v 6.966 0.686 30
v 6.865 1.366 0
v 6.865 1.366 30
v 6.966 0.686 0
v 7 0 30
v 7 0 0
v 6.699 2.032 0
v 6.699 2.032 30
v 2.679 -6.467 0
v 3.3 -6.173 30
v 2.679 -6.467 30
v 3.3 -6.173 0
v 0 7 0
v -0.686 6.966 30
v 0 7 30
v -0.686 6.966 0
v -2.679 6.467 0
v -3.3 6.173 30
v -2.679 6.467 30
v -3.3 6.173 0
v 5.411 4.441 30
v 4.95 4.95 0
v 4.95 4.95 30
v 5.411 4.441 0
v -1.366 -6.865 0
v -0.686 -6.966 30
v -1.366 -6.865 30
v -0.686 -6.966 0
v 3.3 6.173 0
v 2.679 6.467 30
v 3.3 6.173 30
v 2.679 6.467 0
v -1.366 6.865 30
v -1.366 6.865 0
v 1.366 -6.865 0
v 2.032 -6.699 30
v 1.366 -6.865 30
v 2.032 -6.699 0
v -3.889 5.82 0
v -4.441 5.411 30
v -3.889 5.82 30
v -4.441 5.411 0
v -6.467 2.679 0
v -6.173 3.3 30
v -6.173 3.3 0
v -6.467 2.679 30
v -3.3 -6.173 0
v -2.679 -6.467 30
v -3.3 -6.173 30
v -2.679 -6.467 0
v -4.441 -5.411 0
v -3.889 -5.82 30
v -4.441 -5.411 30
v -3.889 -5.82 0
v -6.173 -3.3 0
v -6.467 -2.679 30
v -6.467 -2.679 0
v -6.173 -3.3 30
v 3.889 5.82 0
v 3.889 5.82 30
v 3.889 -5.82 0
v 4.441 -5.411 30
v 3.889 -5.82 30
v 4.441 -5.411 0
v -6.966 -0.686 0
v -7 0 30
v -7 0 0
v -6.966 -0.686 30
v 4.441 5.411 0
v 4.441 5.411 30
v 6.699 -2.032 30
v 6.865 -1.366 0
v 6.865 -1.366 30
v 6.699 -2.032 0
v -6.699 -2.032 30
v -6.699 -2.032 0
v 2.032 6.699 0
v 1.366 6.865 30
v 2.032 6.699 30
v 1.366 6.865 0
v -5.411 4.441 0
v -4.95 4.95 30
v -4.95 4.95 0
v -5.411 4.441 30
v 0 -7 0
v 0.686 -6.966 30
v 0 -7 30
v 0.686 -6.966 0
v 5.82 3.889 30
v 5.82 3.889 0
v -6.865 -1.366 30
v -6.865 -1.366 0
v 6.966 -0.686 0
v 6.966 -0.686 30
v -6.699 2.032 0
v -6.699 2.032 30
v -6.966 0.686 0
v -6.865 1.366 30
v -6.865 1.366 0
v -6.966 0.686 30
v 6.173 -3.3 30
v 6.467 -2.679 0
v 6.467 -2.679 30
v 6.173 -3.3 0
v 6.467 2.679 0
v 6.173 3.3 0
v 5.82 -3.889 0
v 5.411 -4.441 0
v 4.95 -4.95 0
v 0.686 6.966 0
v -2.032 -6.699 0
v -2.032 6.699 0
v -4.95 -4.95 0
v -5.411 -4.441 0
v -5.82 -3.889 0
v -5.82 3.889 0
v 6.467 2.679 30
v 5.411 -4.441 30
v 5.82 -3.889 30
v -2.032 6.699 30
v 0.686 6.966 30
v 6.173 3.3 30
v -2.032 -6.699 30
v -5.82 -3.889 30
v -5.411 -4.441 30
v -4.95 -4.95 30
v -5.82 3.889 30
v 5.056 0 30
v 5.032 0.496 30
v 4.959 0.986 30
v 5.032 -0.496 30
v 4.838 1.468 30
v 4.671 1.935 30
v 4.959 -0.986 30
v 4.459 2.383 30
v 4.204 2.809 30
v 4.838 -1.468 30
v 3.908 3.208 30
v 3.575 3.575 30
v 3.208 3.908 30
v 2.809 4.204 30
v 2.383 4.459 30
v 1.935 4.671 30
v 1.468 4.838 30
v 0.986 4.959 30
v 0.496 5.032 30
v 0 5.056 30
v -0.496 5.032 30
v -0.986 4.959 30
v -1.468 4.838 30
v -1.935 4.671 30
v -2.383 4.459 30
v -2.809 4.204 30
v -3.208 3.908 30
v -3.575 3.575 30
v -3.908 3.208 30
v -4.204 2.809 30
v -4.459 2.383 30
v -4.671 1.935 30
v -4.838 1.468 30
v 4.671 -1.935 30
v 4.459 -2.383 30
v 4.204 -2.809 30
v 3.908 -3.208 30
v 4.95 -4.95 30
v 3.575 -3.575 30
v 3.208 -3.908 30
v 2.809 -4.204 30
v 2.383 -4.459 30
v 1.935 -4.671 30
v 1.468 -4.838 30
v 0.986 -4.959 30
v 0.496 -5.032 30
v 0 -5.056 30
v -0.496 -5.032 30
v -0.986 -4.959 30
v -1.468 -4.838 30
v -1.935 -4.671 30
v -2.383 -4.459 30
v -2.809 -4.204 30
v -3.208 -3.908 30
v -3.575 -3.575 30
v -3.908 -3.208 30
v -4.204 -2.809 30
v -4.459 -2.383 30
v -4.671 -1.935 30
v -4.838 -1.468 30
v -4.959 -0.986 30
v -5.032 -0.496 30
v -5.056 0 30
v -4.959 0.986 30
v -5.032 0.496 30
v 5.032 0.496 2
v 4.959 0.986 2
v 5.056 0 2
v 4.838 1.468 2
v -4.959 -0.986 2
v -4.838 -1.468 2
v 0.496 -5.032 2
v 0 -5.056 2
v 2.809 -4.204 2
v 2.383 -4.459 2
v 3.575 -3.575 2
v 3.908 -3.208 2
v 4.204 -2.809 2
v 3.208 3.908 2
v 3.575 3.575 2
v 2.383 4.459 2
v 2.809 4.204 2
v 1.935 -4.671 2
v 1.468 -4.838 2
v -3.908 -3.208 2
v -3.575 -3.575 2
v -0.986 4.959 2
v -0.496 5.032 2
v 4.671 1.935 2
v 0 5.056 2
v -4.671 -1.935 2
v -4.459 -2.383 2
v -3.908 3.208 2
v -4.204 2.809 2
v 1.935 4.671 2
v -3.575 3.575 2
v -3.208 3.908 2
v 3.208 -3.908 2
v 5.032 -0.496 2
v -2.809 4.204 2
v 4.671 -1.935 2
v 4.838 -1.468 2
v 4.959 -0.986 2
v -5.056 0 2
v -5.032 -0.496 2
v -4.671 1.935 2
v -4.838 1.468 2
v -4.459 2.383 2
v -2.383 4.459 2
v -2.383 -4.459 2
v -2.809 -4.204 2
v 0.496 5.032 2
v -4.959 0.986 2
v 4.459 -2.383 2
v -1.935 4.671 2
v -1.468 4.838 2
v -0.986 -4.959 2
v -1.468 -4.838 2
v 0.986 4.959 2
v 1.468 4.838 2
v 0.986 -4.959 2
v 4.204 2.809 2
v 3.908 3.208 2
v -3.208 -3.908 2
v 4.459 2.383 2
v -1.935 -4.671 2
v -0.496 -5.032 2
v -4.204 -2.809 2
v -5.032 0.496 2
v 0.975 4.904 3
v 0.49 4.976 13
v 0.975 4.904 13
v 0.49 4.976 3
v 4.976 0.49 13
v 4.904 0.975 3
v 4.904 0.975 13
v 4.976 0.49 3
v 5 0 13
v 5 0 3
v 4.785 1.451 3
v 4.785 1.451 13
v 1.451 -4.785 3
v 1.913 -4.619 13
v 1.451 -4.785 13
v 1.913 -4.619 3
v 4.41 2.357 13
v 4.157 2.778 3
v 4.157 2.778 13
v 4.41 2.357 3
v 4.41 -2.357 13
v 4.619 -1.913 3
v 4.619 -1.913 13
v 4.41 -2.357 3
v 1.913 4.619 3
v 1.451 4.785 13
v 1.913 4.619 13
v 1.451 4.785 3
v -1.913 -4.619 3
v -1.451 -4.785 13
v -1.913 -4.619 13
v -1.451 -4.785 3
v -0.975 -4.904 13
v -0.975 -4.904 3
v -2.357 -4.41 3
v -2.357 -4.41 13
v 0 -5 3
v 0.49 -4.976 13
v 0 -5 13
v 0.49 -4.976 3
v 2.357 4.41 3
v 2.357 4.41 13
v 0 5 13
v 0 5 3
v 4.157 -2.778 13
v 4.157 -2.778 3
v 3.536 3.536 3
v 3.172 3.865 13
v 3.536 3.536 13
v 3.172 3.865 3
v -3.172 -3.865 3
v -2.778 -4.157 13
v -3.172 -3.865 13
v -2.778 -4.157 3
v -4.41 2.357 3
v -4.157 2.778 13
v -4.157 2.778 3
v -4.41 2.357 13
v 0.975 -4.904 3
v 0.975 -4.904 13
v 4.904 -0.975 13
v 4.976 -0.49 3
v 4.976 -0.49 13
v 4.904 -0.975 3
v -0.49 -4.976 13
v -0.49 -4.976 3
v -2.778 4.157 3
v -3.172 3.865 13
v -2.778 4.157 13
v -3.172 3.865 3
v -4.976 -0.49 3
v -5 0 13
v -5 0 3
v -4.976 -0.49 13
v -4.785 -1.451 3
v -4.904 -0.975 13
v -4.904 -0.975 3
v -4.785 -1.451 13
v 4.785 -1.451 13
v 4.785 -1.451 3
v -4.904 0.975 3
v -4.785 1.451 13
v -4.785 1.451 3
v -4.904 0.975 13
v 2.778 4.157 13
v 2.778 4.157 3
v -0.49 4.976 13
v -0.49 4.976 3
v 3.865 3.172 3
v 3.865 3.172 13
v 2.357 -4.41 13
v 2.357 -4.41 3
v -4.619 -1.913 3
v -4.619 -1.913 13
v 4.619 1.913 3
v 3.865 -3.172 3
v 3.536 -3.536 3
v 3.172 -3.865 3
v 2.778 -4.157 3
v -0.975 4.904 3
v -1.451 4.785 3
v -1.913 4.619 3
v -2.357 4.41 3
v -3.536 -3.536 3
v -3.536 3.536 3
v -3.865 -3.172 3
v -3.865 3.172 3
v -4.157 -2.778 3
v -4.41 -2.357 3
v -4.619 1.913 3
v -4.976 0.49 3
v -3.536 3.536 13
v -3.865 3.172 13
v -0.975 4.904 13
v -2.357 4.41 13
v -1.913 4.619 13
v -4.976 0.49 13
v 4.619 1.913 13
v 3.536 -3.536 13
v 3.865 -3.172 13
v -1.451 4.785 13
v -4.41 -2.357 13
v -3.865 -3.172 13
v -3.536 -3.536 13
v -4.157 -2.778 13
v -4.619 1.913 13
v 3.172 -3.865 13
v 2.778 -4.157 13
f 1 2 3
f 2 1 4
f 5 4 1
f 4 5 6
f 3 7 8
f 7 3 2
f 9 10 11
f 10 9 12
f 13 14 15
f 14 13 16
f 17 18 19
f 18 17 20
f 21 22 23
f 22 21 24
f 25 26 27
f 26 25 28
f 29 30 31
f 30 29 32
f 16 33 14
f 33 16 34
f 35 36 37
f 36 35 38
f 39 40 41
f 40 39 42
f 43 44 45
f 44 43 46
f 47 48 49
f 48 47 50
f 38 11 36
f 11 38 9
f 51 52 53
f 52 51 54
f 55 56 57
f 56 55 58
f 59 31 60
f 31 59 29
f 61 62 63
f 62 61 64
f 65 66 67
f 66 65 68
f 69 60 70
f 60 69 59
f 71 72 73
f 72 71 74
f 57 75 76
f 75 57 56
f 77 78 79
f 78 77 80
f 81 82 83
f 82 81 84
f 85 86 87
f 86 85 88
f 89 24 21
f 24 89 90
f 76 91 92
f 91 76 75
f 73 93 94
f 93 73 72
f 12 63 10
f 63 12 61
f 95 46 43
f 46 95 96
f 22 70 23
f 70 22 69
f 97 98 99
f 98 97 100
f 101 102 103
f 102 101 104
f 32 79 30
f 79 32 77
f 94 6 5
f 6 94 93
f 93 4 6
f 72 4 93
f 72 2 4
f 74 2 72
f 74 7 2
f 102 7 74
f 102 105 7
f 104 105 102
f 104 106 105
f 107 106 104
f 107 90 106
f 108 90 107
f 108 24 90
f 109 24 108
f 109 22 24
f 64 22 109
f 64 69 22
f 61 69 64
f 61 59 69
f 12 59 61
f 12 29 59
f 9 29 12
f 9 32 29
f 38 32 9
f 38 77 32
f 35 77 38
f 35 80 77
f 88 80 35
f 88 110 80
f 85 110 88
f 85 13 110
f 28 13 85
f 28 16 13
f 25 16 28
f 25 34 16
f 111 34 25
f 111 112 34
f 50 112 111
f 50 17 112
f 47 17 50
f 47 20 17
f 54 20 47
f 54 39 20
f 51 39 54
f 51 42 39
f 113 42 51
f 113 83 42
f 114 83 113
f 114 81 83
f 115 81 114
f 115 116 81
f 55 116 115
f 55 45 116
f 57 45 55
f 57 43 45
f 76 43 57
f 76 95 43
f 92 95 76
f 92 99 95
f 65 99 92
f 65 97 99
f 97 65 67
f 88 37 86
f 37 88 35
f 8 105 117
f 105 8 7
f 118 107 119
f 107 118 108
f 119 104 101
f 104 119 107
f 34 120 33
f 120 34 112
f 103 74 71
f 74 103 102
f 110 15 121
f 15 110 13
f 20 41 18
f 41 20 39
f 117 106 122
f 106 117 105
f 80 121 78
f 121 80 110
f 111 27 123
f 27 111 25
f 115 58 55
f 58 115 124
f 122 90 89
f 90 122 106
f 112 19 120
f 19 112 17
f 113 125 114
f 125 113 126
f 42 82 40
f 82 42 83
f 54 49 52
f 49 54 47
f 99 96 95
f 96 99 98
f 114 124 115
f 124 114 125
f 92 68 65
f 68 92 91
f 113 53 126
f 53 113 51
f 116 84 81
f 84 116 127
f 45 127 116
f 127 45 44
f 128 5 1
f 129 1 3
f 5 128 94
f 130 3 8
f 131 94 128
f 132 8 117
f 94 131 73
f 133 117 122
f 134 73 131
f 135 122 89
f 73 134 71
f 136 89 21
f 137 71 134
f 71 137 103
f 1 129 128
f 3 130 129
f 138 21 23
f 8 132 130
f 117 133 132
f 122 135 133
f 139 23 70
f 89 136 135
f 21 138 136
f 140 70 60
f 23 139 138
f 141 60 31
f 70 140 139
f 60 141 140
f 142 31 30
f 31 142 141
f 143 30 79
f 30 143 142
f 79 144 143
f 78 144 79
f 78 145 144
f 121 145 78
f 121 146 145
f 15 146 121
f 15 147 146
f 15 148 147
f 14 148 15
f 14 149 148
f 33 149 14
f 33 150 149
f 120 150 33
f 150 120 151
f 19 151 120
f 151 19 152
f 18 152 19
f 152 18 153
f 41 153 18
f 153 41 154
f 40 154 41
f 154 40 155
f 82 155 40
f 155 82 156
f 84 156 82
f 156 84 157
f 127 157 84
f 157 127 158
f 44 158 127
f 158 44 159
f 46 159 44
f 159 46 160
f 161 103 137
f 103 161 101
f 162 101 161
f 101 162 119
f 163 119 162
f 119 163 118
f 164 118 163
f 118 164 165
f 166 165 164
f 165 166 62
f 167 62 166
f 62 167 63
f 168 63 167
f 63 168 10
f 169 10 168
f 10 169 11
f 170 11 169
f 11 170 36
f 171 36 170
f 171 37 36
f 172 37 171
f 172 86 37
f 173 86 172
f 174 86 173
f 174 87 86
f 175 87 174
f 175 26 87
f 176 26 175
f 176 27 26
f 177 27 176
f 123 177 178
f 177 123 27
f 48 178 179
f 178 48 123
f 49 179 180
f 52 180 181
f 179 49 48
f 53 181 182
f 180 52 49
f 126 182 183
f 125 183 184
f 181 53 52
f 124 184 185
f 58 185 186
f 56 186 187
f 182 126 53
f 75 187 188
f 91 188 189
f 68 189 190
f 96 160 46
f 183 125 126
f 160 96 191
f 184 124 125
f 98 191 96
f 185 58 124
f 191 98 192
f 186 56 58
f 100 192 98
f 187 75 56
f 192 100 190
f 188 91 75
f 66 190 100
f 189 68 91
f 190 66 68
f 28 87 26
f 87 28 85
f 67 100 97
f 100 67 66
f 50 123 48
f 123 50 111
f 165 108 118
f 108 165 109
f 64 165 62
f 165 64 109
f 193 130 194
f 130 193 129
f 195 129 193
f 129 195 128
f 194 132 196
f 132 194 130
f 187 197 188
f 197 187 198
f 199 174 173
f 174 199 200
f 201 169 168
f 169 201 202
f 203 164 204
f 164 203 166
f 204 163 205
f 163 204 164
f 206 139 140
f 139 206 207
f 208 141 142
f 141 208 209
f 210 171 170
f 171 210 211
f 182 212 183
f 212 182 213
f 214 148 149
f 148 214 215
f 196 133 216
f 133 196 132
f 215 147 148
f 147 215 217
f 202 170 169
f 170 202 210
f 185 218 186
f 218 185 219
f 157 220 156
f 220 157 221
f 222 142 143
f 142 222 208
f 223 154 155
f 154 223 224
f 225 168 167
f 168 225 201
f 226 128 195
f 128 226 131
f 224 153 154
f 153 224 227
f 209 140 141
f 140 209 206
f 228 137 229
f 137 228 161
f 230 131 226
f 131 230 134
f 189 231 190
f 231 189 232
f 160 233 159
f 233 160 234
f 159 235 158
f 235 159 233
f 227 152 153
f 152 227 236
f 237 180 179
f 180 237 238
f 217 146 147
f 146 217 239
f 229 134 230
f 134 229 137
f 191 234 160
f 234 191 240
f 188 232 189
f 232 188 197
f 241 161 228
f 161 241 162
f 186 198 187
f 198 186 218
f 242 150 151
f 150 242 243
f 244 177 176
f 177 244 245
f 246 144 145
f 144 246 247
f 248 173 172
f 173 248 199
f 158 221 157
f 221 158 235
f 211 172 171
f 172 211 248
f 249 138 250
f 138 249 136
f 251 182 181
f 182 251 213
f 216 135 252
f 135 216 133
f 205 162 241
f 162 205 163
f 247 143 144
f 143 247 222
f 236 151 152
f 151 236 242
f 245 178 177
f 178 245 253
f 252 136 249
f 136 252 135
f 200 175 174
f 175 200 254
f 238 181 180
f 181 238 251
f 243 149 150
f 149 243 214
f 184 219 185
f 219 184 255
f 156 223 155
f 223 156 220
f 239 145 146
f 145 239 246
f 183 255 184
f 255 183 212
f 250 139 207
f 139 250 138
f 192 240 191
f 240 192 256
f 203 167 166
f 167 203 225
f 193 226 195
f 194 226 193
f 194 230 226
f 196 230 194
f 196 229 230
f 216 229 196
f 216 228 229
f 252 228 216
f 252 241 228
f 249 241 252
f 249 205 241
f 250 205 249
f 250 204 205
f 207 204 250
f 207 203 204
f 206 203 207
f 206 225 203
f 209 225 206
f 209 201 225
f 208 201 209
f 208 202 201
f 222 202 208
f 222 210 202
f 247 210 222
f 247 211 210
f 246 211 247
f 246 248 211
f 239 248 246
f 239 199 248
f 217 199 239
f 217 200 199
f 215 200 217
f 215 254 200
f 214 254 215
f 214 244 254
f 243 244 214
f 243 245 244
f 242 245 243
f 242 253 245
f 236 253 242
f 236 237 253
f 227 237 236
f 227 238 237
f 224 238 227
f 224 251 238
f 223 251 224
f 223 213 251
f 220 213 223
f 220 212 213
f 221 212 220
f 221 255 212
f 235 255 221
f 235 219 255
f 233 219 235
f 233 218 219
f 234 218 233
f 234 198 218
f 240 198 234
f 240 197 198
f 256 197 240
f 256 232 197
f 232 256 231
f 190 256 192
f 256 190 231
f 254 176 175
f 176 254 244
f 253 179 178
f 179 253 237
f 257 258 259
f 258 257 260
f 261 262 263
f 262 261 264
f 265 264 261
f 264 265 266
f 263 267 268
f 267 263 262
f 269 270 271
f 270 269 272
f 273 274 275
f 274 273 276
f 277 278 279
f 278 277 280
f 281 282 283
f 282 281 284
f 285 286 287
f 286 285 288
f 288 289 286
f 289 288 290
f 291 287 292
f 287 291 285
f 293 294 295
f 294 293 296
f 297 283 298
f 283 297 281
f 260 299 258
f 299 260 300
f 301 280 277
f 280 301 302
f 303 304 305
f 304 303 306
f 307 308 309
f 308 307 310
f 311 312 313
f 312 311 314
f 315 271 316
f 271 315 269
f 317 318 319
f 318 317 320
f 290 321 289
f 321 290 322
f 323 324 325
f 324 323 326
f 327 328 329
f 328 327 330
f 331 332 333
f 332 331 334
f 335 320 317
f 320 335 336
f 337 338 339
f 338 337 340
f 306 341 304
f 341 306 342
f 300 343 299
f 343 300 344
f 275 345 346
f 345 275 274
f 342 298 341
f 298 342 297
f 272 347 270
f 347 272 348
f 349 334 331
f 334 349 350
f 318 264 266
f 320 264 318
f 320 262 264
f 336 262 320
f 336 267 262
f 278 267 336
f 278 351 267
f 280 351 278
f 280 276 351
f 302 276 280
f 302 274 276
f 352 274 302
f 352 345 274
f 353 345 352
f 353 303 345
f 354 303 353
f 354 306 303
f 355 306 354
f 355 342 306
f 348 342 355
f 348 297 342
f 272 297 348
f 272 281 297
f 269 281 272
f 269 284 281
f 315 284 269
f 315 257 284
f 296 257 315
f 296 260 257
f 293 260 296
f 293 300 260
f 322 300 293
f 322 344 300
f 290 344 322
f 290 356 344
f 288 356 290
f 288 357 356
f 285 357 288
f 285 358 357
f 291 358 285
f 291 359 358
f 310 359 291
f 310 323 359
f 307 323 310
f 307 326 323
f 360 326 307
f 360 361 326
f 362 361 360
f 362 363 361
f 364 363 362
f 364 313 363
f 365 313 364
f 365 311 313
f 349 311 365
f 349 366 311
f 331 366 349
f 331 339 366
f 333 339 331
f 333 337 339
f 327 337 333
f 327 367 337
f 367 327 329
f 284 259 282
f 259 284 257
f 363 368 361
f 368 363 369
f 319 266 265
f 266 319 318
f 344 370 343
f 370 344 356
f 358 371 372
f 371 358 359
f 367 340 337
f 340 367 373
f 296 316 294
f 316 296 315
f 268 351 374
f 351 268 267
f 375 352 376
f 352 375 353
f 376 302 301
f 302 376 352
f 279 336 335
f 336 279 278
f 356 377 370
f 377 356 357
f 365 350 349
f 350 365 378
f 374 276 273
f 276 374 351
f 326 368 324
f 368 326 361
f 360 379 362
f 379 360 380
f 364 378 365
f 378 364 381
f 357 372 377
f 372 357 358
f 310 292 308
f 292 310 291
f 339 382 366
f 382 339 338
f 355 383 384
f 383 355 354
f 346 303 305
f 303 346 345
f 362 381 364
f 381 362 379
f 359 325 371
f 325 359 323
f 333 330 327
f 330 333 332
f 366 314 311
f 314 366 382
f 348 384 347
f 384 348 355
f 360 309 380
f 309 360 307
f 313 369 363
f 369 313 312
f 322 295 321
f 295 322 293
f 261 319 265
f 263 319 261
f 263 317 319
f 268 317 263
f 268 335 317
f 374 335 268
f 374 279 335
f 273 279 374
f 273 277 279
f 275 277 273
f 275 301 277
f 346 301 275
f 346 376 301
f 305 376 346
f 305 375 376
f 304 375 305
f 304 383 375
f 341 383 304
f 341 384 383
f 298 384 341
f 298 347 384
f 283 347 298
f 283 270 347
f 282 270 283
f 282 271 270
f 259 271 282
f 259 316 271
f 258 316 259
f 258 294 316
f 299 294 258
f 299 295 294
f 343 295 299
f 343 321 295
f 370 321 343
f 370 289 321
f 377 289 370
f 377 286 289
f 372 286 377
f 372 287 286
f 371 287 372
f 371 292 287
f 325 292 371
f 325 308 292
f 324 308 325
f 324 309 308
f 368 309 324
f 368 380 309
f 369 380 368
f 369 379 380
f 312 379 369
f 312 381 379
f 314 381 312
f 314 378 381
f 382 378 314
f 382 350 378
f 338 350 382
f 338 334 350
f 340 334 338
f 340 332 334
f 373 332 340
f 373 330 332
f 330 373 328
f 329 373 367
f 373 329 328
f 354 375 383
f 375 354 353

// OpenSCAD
// Adversarial: the piston is 0.05 mm per side too large for the bore.
// A cup and a piston, correctly separated and freely sliding, with the wrong
// fit: only the clearance check should decide this.
agentscad_part = "all";
piston_stroke = 0;   // pose control: the benchmark re-renders the piston at this stroke
$fn = 64;

bore_d = 10.10 / cos(180 / $fn);

module barrel() {
  difference() {
    translate([0, 0, 0]) cylinder(h = 30, d = 14);
    translate([0, 0, 2]) cylinder(h = 29, d = bore_d);
  }
}

module piston() {
  translate([0, 0, 3 + piston_stroke]) cylinder(h = 10, d = 10);
}

module generated_part() {
  if (agentscad_part == "all" || agentscad_part == "barrel") barrel();
  if (agentscad_part == "all" || agentscad_part == "piston") piston();
}

generated_part();
